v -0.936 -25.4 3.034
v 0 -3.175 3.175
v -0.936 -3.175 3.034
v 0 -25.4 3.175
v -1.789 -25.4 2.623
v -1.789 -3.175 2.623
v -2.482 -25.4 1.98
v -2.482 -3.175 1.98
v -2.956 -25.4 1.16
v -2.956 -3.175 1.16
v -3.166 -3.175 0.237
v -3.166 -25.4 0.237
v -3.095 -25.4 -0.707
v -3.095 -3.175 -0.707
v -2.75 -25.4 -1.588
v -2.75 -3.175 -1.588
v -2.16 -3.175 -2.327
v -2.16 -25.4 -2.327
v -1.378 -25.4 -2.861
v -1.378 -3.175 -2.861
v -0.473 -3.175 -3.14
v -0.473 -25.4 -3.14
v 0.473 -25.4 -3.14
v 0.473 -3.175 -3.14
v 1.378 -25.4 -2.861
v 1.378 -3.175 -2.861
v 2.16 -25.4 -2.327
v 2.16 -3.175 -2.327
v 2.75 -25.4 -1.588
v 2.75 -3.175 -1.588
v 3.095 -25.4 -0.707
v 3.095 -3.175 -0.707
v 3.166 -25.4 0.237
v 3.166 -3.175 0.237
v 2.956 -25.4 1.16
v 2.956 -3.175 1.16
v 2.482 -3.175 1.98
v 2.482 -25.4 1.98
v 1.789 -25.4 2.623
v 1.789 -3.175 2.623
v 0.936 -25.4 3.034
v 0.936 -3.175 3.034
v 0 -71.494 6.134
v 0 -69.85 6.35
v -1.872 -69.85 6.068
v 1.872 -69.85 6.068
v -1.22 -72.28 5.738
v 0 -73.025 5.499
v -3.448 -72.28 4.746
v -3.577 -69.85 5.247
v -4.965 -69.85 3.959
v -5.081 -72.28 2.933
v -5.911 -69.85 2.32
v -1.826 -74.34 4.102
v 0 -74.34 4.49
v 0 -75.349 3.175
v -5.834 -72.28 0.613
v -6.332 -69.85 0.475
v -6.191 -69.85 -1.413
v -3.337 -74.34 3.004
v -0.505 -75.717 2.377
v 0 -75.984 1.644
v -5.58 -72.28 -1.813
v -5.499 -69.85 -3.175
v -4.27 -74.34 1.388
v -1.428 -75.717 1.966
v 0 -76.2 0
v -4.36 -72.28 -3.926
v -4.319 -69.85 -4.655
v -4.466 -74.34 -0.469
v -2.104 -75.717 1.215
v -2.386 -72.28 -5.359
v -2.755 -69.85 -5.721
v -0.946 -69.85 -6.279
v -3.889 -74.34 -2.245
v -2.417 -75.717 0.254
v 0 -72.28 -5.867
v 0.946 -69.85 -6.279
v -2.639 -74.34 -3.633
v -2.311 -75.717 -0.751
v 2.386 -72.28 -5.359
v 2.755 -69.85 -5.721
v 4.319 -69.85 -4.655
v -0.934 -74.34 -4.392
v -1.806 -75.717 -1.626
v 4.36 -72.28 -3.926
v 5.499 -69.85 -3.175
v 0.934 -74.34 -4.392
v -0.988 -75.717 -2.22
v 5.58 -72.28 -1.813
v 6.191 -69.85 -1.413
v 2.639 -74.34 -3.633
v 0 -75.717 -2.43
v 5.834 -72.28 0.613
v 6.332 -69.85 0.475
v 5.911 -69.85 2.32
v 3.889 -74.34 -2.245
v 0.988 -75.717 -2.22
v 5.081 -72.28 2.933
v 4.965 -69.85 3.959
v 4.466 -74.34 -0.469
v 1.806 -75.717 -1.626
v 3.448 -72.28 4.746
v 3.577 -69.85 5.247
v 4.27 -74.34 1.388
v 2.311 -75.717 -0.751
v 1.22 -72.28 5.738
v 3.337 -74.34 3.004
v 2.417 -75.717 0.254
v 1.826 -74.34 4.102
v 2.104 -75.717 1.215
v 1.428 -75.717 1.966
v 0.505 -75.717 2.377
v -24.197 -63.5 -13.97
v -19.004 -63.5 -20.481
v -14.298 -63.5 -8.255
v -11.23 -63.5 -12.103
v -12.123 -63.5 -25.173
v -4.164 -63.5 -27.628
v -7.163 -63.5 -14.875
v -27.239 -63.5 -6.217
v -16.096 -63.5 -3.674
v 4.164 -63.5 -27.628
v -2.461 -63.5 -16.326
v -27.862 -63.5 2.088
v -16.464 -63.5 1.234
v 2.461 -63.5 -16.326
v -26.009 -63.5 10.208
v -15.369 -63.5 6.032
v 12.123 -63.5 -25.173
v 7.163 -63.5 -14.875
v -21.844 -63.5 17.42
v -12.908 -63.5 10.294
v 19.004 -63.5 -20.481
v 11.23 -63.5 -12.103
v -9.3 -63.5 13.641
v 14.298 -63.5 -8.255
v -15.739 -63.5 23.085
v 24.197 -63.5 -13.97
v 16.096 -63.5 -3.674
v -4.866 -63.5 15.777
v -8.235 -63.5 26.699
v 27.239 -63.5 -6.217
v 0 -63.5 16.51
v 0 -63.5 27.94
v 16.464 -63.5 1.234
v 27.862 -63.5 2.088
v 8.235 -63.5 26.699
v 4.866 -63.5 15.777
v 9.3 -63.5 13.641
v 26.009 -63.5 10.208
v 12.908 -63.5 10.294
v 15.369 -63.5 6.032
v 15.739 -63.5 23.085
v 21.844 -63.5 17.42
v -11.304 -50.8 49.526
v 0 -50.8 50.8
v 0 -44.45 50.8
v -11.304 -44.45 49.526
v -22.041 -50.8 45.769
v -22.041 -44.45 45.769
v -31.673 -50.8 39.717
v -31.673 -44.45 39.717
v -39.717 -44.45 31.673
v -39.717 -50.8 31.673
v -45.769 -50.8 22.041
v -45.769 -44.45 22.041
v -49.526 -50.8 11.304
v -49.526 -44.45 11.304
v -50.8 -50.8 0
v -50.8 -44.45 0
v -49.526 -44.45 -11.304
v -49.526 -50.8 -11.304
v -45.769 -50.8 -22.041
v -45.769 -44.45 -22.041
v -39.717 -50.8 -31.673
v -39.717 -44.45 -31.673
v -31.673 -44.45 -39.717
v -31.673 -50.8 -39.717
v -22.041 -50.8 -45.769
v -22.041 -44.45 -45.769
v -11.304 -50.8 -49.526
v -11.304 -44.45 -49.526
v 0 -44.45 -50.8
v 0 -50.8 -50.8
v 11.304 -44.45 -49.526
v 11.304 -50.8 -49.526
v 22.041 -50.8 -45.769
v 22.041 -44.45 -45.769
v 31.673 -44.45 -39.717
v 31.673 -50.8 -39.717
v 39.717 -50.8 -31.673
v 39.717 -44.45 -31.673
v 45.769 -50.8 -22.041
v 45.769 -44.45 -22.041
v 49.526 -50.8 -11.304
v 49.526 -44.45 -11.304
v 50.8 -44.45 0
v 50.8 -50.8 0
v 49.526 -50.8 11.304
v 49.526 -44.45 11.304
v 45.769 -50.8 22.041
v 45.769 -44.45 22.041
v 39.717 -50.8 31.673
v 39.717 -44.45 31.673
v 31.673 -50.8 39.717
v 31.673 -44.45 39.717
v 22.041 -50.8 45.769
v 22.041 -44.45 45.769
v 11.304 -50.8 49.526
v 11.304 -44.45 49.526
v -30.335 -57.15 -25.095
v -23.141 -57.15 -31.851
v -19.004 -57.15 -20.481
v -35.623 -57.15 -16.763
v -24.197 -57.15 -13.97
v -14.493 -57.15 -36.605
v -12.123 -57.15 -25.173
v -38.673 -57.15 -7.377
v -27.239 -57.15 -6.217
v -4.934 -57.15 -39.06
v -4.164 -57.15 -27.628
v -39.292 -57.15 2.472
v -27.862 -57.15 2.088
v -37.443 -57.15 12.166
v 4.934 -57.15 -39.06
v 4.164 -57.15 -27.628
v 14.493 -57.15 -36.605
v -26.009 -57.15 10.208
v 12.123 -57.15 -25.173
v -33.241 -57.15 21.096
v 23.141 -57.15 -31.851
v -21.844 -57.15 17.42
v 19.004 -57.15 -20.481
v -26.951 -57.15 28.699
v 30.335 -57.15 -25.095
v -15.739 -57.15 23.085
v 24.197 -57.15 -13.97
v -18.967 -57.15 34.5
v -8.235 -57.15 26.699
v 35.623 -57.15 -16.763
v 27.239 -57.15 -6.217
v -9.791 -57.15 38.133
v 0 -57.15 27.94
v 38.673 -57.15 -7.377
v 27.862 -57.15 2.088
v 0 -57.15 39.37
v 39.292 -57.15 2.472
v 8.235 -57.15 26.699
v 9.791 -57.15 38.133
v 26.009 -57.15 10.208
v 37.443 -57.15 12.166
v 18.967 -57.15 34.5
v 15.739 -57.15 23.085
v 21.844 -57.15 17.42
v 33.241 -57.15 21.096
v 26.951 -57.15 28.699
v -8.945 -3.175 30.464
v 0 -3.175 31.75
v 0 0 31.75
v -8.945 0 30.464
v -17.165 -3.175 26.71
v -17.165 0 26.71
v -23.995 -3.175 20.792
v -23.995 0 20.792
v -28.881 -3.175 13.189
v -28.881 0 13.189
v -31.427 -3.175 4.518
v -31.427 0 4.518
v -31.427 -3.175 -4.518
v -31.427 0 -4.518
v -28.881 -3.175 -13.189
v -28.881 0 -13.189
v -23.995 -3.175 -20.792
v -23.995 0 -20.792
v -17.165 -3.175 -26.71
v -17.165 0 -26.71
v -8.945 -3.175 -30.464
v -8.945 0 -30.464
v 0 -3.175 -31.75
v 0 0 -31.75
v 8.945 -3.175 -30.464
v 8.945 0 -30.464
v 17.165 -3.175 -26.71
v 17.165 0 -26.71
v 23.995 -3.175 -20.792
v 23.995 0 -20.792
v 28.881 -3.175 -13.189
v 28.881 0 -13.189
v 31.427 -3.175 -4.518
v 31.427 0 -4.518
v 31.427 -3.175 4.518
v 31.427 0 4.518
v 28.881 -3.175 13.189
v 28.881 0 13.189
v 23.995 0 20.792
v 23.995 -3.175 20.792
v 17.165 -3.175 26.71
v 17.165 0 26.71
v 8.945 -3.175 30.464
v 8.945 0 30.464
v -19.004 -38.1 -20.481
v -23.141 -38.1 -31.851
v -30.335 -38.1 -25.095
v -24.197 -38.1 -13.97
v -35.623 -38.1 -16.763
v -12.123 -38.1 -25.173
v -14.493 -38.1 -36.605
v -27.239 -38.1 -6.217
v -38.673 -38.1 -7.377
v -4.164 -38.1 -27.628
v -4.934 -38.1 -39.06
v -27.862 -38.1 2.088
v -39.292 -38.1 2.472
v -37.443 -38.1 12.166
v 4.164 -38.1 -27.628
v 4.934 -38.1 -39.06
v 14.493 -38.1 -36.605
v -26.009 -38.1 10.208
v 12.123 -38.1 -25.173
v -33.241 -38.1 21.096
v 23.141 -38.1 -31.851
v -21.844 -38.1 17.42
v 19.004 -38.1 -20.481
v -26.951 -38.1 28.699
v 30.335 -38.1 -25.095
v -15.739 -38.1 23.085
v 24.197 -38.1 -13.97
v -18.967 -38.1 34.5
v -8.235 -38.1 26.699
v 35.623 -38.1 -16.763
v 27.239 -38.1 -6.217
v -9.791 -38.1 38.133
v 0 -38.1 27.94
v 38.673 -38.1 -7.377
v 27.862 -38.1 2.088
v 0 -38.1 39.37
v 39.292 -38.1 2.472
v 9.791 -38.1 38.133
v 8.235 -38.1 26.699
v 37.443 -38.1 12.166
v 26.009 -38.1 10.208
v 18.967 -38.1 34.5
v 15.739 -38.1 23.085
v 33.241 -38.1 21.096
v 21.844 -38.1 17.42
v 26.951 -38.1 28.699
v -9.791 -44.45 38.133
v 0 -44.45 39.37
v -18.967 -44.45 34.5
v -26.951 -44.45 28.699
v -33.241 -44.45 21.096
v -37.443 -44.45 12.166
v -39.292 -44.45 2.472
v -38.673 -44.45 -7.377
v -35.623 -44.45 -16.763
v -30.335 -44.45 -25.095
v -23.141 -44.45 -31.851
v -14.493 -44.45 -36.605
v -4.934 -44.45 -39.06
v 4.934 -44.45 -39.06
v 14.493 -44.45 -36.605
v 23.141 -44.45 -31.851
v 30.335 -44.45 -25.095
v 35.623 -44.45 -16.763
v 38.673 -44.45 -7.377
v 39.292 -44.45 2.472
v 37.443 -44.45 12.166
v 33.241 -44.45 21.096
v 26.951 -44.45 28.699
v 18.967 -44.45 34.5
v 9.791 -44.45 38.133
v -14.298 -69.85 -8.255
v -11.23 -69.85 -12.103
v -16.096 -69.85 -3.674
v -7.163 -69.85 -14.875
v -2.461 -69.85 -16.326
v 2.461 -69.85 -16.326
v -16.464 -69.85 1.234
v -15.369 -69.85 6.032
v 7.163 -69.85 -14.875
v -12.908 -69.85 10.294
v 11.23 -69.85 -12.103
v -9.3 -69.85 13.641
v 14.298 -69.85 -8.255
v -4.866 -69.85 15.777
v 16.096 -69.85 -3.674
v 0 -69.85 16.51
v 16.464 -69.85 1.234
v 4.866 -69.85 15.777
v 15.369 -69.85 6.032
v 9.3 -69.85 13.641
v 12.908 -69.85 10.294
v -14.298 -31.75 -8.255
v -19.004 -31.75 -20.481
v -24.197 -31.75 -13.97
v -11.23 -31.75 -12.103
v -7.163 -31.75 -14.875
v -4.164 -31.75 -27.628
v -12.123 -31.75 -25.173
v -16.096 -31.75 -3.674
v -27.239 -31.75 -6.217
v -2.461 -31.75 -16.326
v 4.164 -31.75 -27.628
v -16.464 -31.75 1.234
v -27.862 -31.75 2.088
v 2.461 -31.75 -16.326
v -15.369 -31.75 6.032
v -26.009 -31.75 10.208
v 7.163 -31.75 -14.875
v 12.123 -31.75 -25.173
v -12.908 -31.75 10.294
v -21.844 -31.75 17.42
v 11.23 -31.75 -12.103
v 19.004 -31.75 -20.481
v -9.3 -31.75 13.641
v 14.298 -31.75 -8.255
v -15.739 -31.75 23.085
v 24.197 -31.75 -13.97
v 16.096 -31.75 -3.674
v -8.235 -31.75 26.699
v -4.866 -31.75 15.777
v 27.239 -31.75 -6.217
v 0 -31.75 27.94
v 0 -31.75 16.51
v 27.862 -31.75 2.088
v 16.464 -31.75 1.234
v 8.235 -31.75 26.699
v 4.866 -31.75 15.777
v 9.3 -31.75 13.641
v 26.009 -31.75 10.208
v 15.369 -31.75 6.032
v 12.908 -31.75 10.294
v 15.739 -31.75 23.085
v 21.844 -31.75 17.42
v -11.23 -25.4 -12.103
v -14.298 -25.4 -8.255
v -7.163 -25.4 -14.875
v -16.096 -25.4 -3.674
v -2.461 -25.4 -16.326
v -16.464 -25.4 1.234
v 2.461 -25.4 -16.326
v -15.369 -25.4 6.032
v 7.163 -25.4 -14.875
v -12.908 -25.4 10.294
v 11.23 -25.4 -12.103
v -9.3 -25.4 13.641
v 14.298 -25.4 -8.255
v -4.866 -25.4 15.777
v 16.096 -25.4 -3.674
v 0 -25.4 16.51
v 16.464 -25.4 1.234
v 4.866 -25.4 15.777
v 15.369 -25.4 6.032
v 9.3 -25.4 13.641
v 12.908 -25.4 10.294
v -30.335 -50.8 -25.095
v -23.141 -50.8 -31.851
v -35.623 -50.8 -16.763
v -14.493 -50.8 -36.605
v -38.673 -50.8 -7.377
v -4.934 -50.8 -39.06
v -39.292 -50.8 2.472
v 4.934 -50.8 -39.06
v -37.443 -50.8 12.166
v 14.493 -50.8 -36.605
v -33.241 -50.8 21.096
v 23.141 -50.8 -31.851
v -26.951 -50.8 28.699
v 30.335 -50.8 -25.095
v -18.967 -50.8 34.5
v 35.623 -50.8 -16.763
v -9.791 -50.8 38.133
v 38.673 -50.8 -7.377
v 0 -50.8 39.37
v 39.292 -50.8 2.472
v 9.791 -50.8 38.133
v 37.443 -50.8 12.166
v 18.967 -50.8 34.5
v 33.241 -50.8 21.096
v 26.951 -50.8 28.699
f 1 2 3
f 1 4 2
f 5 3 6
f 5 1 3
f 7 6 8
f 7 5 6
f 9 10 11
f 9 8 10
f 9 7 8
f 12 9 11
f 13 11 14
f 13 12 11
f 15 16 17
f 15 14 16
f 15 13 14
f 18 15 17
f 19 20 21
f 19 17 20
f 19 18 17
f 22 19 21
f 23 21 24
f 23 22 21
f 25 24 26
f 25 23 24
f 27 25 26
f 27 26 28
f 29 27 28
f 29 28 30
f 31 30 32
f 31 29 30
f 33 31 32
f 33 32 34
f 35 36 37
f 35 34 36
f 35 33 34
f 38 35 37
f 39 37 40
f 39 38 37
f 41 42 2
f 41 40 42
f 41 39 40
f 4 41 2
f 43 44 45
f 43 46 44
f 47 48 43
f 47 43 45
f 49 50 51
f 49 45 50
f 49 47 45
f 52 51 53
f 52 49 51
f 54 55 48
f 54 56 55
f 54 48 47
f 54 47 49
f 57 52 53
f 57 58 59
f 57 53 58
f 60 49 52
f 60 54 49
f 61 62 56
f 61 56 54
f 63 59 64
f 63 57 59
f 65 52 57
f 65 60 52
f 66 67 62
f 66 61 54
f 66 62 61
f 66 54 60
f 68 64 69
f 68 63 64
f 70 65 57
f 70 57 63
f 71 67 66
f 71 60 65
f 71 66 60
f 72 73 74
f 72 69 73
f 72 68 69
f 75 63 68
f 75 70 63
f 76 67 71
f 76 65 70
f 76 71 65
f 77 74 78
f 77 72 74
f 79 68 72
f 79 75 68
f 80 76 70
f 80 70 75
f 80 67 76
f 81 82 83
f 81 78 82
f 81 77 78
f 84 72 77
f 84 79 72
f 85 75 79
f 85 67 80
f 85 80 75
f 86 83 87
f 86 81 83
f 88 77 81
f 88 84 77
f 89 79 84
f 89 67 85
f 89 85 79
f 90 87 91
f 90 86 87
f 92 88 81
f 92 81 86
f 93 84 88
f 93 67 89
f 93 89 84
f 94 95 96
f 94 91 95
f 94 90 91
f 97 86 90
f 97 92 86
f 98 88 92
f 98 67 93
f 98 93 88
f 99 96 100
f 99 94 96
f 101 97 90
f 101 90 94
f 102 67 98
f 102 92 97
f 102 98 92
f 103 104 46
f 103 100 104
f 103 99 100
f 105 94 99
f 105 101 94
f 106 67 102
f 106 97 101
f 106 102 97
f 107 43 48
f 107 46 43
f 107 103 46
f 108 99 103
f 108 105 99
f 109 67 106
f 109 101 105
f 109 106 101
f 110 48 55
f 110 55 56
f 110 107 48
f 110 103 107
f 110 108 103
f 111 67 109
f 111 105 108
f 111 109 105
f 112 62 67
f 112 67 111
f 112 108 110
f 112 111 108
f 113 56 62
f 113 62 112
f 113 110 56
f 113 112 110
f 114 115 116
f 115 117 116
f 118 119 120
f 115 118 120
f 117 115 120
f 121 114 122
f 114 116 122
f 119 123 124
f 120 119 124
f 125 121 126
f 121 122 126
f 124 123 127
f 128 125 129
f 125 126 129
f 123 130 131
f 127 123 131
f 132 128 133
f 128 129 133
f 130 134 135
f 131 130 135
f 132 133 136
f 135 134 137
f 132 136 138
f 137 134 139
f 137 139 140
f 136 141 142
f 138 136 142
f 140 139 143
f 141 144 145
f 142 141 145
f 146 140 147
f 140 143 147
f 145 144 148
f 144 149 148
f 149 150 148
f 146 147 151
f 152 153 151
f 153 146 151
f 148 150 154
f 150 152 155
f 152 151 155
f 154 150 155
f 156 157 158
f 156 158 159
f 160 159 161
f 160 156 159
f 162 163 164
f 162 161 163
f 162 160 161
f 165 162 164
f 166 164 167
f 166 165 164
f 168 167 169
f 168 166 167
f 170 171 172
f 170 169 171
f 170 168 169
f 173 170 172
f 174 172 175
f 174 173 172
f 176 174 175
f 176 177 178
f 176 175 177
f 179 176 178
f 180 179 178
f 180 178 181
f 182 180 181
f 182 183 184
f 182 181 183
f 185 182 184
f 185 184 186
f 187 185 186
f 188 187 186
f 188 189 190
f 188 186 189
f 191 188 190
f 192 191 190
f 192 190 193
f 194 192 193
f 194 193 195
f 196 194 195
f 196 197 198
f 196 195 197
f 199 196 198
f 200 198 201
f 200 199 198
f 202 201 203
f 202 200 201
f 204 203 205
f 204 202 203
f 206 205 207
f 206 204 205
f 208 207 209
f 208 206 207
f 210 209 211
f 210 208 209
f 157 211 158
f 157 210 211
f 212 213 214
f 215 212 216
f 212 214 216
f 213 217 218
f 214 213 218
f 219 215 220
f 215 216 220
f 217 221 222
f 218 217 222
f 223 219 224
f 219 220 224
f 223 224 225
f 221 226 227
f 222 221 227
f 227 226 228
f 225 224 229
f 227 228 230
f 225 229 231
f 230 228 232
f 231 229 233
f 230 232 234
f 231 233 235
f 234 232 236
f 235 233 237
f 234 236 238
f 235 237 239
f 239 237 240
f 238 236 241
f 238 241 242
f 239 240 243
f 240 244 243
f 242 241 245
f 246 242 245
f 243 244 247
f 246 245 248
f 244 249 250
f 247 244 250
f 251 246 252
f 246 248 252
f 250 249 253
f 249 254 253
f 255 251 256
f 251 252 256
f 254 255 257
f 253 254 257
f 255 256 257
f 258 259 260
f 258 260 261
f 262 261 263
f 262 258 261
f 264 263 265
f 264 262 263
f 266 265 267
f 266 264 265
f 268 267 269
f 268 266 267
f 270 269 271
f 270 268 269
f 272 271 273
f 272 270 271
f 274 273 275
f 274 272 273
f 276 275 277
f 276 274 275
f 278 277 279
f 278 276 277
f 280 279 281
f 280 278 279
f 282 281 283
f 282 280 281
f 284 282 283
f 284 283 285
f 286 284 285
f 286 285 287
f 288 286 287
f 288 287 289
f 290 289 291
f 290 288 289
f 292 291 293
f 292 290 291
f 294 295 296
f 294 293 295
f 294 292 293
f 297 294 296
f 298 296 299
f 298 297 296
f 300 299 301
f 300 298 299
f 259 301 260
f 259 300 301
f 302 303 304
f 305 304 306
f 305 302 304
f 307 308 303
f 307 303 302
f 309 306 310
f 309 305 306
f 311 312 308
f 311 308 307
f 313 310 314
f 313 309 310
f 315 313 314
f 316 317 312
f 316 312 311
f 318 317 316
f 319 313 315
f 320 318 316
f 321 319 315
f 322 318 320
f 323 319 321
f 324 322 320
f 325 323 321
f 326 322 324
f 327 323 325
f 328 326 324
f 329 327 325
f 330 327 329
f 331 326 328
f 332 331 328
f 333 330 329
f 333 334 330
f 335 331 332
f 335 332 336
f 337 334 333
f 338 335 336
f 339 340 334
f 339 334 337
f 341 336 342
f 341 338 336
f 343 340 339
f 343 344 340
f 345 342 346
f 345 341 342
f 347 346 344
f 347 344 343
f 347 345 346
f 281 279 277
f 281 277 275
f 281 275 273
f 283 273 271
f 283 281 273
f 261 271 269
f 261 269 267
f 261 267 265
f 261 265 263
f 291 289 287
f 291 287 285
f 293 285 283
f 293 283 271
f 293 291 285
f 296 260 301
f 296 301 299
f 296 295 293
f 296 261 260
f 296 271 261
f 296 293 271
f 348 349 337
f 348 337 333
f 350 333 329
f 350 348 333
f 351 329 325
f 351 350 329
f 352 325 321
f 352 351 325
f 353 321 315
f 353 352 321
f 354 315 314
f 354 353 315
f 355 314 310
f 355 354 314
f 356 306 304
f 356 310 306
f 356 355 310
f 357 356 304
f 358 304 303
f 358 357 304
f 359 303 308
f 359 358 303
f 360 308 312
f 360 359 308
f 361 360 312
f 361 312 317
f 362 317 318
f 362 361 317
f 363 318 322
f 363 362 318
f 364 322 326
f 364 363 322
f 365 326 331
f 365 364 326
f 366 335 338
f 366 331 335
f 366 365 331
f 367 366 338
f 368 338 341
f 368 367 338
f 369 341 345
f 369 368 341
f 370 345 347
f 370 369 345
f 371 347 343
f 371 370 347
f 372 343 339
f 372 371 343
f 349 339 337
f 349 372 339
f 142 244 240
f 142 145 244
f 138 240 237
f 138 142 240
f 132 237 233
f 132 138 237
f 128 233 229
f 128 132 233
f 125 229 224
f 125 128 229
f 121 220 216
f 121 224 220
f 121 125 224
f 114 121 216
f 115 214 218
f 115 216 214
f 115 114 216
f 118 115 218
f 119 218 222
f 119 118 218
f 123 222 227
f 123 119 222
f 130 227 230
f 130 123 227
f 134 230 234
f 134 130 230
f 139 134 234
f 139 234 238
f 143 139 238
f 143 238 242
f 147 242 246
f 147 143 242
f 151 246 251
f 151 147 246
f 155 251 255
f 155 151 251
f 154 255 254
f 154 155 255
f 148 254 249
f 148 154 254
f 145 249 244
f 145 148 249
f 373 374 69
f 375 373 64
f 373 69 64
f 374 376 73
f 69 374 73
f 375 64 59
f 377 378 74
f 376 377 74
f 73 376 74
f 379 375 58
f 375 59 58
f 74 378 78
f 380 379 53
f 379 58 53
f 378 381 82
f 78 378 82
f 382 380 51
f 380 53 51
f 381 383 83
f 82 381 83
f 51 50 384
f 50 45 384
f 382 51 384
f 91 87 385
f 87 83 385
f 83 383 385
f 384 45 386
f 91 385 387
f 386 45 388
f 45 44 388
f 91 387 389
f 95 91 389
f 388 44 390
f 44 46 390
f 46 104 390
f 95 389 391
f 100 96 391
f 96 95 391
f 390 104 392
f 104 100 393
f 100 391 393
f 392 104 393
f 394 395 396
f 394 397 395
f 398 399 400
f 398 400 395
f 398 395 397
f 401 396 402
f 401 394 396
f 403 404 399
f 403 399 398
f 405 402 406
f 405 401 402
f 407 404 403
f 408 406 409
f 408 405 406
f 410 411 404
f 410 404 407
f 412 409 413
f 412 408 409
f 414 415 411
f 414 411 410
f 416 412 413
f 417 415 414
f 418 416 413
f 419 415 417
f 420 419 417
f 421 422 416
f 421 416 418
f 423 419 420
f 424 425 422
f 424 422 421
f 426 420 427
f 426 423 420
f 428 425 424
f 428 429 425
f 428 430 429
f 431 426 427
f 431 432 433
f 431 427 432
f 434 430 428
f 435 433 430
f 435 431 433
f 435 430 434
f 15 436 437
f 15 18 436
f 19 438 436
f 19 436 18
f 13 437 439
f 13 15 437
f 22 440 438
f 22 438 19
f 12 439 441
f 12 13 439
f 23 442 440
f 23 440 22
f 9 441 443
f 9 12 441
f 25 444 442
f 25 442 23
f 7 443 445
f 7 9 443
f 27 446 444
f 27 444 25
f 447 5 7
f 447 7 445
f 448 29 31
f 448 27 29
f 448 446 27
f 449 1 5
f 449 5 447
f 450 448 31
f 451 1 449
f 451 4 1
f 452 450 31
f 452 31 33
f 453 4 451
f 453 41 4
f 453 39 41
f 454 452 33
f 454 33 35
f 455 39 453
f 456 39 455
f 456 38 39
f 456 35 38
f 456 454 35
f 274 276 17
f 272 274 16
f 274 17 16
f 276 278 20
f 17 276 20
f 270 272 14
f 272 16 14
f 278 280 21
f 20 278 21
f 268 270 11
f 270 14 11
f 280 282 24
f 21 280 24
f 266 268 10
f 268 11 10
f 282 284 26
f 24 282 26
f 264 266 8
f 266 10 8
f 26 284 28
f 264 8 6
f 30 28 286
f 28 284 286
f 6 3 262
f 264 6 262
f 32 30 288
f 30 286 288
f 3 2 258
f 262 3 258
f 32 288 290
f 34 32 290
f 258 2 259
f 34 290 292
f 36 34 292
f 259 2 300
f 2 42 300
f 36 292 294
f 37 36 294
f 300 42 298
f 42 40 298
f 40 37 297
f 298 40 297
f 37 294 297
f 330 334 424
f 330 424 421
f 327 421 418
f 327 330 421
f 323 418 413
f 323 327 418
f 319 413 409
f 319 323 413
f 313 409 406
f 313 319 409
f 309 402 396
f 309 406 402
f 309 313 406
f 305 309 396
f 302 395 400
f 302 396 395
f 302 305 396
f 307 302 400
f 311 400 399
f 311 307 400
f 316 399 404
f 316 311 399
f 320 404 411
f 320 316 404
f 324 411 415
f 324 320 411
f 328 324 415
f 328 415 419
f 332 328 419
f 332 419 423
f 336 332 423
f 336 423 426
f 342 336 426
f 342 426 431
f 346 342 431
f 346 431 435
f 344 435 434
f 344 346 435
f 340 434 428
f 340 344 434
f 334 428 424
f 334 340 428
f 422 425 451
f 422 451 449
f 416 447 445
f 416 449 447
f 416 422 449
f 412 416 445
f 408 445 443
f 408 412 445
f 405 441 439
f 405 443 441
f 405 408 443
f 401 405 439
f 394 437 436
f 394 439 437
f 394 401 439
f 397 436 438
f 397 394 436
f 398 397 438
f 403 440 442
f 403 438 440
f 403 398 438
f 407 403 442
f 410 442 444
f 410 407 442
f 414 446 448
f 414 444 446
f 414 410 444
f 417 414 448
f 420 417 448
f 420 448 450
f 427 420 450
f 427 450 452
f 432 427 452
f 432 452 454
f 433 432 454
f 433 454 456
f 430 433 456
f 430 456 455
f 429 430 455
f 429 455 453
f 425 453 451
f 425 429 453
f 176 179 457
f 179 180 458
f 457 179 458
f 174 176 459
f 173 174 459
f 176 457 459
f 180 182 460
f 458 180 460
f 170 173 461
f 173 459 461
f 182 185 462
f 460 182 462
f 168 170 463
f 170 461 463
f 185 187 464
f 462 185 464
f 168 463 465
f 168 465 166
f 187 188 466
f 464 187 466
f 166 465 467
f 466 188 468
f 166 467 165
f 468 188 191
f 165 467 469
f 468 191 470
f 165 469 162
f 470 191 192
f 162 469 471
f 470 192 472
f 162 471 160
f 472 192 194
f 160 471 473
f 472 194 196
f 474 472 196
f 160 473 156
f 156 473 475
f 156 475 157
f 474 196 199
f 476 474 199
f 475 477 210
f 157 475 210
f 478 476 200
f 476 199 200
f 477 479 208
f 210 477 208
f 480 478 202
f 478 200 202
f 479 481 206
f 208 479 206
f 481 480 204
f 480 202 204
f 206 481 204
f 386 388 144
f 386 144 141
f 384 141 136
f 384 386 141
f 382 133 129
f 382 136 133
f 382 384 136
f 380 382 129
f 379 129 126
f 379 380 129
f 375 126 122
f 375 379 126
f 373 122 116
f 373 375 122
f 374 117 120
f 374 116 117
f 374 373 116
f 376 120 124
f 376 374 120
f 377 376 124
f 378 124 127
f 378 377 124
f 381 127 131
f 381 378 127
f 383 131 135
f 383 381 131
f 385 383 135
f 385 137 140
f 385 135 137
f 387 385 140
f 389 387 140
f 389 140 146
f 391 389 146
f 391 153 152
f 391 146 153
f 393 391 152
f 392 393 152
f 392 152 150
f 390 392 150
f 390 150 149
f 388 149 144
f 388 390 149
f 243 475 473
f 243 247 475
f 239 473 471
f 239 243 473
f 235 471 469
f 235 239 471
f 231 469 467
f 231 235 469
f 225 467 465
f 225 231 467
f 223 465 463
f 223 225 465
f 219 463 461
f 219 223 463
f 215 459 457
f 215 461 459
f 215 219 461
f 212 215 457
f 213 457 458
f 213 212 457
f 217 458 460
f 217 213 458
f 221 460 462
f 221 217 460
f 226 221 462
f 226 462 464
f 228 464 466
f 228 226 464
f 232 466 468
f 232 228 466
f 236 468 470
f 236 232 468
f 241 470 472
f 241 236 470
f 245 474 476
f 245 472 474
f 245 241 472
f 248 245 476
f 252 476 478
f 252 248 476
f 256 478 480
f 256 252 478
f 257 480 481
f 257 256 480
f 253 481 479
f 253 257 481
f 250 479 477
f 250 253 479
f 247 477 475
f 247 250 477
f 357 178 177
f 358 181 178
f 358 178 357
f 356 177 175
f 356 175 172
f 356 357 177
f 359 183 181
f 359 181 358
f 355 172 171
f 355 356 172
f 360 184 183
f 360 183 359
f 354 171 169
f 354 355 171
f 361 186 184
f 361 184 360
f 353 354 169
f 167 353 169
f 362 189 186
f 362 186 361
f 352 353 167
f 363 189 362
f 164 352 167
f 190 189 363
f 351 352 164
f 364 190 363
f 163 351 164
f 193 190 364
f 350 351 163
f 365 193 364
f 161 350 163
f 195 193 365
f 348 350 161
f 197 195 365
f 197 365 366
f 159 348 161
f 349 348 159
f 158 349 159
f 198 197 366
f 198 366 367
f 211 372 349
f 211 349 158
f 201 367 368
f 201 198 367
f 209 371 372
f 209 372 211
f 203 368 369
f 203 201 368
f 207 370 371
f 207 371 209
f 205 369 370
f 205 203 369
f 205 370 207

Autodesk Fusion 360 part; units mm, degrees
sketch "Sketch1" plane through (0, 0, 0) normal (1, 0, 0) x (0, 1, 0) in component "Doorknob_Revolve_Addition"
  line L0 (0, 0) -> (0, 31.75)
  line L1 (-25.4, 3.175) -> (-25.4, 16.51)
  line L2 (-31.75, 16.51) -> (-31.75, 27.94)
  line L3 (-31.75, 27.94) -> (-38.1, 27.94)
  line L4 (-38.1, 27.94) -> (-38.1, 39.37)
  line L5 (-25.4, 16.51) -> (-31.75, 16.51)
  line L6 (-38.1, 39.37) -> (-44.45, 39.37)
  line L7 (-44.45, 39.37) -> (-44.45, 50.8)
  line L8 (-44.45, 50.8) -> (-50.8, 50.8)
  line L9 (-50.8, 50.8) -> (-50.8, 39.37)
  line L10 (-50.8, 39.37) -> (-57.15, 39.37)
  line L11 (-57.15, 39.37) -> (-57.15, 27.94)
  line L12 (-57.15, 27.94) -> (-63.5, 27.94)
  line L13 (-63.5, 27.94) -> (-63.5, 16.51)
  line L14 (-63.5, 16.51) -> (-69.85, 16.51)
  line L15 (-69.85, 16.51) -> (-69.85, 6.35)
  line L16 (-76.2, 0) -> (0, 0)
  arc A0 (-69.85, 6.35) -> (-76.2, 0) centre (-69.85, 0) ccw
  line L17 (0, 31.75) -> (-3.175, 31.75)
  line L18 (-3.175, 31.75) -> (-3.175, 3.175)
  line L19 (-3.175, 3.175) -> (-25.4, 3.175)
  dimension "d4" = 76.2
  dimension "d5" = 31.75
  dimension "d6" = 50.8
  dimension "d10" = 11.43
  dimension "d11" = 11.43
  dimension "d12" = 11.43
  dimension "d13" = 6.35
  dimension "d14" = 6.35
  dimension "d15" = 6.35
  dimension "d16" = 6.35
  dimension "d20" = 6.35
  dimension "d22" = 3.175
  dimension "d23" = 3.175
  dimension "d24" = 22.225
revolve "Revolve1" add sketch "Sketch1" angle 360 about axis through (0, -76.2, 0) along (0, 1, 0) in component "Doorknob_Revolve_Addition"
component "Doorknob_Revolve_Addition" placed x (1, 0, 0) y (0, 1, 0) z (0, 0, 1) at (0, 0, 0)
equation "d5 = ( 2.5 / 2 ) * 1 in"
equation "d11 = d10"
equation "d12 = d10"
equation "d14 = d13"
equation "d15 = d14"
equation "d16 = d13"
